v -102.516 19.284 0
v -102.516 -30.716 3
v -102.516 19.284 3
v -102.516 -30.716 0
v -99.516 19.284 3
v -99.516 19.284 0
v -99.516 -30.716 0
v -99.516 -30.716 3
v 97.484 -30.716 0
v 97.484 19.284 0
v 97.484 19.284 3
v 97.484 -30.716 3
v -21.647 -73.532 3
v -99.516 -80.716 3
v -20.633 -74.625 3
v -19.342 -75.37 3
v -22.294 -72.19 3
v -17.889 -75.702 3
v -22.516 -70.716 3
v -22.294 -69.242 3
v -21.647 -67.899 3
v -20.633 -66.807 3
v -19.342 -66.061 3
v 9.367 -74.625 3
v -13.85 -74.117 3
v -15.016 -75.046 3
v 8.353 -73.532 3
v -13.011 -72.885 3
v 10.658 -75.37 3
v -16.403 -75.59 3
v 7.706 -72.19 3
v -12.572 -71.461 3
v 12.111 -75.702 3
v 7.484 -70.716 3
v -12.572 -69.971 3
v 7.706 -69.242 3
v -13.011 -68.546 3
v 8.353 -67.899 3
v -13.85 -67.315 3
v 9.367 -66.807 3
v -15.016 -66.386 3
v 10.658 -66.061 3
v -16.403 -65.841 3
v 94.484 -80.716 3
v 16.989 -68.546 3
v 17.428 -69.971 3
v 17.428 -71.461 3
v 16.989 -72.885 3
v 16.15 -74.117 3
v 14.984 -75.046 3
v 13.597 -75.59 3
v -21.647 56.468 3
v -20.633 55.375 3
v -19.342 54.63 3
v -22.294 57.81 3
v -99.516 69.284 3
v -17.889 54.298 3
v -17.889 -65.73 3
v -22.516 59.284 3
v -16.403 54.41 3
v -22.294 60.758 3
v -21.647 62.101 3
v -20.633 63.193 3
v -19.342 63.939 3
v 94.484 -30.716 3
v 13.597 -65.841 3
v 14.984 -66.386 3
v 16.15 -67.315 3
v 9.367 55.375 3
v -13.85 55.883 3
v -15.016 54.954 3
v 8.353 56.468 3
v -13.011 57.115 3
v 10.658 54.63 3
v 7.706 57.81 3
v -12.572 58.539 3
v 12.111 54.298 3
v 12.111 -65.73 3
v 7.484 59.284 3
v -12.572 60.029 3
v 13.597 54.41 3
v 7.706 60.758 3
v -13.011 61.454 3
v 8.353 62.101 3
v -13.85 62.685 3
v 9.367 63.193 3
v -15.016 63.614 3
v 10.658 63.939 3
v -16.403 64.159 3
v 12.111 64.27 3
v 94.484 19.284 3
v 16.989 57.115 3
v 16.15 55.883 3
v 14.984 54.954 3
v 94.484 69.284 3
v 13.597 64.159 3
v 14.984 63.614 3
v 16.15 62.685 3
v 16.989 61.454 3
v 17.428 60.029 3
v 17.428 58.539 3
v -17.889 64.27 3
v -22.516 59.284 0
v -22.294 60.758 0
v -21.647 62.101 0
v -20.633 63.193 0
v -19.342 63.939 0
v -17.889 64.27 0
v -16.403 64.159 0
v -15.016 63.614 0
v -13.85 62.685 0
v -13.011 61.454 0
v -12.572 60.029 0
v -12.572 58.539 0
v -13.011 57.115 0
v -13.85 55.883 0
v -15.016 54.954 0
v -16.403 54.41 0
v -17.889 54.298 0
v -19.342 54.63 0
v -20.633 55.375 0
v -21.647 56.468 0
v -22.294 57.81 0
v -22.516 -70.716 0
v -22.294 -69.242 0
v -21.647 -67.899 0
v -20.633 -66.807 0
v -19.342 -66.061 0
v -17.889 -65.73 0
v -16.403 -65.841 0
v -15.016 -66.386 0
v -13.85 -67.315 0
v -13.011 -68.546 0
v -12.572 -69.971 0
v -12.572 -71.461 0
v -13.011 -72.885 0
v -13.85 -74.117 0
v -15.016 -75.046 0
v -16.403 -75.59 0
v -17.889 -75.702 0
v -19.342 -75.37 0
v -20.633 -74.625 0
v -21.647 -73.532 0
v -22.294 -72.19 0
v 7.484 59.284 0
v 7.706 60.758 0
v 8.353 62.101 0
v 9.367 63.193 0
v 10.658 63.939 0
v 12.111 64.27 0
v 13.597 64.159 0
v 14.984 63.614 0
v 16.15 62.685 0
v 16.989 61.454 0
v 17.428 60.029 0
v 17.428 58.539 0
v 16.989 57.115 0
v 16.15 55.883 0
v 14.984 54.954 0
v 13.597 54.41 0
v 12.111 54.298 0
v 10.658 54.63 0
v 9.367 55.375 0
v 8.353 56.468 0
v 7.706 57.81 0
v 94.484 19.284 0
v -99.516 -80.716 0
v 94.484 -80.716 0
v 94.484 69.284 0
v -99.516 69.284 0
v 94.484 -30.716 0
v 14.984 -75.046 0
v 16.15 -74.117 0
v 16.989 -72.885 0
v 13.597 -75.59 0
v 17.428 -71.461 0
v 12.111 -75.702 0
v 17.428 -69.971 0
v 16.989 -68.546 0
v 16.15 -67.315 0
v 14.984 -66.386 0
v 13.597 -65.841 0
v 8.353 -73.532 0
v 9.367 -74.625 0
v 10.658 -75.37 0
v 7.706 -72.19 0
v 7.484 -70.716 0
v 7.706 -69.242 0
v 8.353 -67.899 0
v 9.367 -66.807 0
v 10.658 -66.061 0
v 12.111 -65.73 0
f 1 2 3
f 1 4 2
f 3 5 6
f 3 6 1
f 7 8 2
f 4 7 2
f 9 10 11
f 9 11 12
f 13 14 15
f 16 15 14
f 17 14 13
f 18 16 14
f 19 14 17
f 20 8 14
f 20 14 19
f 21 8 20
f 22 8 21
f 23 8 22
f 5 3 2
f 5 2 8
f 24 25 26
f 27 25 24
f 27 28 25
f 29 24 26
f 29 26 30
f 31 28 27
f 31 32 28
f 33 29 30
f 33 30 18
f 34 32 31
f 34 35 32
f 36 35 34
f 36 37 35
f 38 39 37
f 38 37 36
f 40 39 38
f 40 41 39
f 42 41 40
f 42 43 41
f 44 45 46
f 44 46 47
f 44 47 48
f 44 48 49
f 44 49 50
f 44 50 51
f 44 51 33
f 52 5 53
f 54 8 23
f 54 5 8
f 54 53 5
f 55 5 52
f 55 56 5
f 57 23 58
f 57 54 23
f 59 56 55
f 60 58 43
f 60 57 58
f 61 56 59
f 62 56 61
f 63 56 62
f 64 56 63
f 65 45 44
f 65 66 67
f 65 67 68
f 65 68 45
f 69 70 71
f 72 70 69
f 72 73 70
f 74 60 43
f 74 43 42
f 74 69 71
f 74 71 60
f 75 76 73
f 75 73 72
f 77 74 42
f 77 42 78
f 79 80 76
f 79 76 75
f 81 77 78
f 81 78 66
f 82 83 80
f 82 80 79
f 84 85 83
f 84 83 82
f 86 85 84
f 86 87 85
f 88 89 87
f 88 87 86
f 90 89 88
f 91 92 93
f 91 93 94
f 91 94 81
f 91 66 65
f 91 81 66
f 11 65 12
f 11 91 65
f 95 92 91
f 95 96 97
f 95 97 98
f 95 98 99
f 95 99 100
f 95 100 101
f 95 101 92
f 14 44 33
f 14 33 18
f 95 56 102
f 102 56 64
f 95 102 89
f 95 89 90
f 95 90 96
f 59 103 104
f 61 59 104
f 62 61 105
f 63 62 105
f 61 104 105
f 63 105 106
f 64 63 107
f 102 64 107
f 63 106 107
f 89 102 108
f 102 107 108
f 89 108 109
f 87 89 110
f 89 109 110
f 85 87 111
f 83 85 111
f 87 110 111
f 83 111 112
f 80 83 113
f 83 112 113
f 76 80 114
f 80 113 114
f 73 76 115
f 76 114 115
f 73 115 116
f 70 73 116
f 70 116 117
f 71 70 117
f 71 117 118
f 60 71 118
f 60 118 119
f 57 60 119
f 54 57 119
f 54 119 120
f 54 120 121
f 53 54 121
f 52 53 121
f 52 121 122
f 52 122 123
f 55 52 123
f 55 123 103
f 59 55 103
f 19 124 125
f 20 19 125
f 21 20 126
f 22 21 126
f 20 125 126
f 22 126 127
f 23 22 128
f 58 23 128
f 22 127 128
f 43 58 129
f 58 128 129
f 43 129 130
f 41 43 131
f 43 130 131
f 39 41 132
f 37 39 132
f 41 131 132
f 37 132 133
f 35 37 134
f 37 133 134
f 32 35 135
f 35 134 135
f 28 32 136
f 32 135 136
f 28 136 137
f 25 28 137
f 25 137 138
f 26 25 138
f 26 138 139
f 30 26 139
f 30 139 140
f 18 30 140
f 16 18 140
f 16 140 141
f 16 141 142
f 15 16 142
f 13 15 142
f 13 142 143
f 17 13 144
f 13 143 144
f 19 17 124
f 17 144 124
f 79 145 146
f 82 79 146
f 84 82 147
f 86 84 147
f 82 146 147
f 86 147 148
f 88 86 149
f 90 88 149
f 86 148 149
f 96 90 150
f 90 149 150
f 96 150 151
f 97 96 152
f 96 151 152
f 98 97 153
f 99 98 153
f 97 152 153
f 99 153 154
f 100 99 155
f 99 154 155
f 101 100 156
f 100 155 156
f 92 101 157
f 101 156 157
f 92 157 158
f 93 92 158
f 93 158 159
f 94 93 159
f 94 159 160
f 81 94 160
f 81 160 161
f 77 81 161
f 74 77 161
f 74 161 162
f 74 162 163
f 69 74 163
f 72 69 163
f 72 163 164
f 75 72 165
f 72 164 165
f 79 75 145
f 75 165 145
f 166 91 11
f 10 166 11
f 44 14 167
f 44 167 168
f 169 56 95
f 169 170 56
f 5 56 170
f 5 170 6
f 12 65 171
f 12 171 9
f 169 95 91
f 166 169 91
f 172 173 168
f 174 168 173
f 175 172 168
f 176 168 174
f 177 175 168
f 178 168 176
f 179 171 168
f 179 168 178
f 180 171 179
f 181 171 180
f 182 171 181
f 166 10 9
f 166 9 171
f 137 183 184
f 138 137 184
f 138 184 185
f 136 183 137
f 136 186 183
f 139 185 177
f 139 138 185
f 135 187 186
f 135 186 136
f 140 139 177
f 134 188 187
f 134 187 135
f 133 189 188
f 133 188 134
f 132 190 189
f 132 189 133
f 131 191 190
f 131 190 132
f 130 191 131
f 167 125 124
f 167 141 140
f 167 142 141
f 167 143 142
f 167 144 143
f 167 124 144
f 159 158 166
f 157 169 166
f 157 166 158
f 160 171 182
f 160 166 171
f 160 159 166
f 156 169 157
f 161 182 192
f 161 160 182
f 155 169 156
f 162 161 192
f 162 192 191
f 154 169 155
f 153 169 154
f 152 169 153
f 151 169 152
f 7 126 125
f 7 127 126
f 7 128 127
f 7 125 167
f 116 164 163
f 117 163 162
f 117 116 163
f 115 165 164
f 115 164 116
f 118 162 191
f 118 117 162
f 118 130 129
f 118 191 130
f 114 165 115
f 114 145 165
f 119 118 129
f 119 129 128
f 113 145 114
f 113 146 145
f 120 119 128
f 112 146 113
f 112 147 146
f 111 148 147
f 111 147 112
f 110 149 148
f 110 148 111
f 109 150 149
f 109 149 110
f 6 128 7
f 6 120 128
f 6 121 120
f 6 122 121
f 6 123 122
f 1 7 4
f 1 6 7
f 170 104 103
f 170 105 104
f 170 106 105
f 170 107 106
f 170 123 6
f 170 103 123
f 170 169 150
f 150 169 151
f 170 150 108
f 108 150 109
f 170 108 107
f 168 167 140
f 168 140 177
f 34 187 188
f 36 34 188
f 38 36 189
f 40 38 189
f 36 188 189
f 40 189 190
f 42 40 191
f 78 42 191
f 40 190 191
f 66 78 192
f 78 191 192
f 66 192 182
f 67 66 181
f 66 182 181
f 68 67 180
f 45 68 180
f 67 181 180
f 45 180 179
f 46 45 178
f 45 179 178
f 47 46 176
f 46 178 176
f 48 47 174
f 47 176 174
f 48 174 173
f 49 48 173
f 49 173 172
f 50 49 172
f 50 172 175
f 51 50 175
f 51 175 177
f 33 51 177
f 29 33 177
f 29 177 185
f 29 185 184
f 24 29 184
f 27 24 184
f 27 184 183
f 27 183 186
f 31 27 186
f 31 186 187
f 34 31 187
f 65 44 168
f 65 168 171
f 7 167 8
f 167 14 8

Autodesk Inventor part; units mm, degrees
ref_plane "YZ Plane" through (0, 0, 0) normal (1, 0, 0) x (0, 1, 0)
ref_plane "XZ Plane" through (0, 0, 0) normal (0, 1, 0) x (-1, 0, 0)
ref_plane "XY Plane" through (0, 0, 0) normal (0, 0, 1) x (1, 0, 0)
sketch "Sketch1" plane through (0, 0, 0) normal (0, 0, 1) x (1, 0, 0)
  line L0 (-102.5157, 69.2842) -> (97.4843, 69.2842)
  line L1 (97.4843, 69.2842) -> (97.4843, -80.7158)
  line L2 (97.4843, -80.7158) -> (-102.5157, -80.7158)
  line L3 (-102.5157, -80.7158) -> (-102.5157, 69.2842)
  point P0 (0, 0)
extrude "Extrusion1" add sketch "Sketch1" along normal blind 3
sketch "Sketch3" plane through (0, 0, 3) normal (0, 0, 1) x (1, 0, 0)
  point P0 (0, 0)
sketch "Sketch4" plane through (0, 0, 3) normal (0, 0, 1) x (1, 0, 0)
  line L0 (97.4843, 69.2842) -> (-102.5157, 69.2842) projected
  line L1 (-102.5157, 69.2842) -> (-99.5157, 69.2842)
  line L2 (-99.5157, 69.2842) -> (-99.5157, 19.2842)
  line L3 (-99.5157, 19.2842) -> (-102.5157, 19.2842)
  line L4 (-102.5157, 19.2842) -> (-102.5157, 69.2842)
  point P0 (0, 0)
extrude "Extrusion2" cut sketch "Sketch4" against normal blind 3
sketch "Sketch5" plane through (0, 0, 3) normal (0, 0, 1) x (1, 0, 0)
  line L0 (97.4843, -80.7158) -> (94.4843, -80.7158)
  line L1 (94.4843, -80.7158) -> (94.4843, -30.7158)
  line L2 (94.4843, -30.7158) -> (97.4843, -30.7158)
  line L3 (97.4843, -30.7158) -> (97.4843, -80.7158)
  point P0 (0, 0)
  point P1 (-102.5157, -80.7158)
  dimension "d17" = 3
  dimension "d18" = 50
extrude "Extrusion3" cut sketch "Sketch5" against normal blind 3
sketch "Sketch6" plane through (0, 0, 3) normal (0, 0, 1) x (1, 0, 0)
  line L0 (97.4843, -30.7158) -> (97.4843, 69.2842) projected
  line L1 (97.4843, 69.2842) -> (94.4843, 69.2842)
  line L2 (94.4843, 69.2842) -> (94.4843, 19.2842)
  line L3 (94.4843, 19.2842) -> (97.4843, 19.2842)
  line L4 (97.4843, 19.2842) -> (97.4843, 69.2842)
  point P0 (0, 0)
  dimension "d21" = 50
  dimension "d22" = 3
extrude "Extrusion4" cut sketch "Sketch6" against normal blind 3
sketch "Sketch7" plane through (0, 0, 3) normal (0, 0, 1) x (1, 0, 0)
  line L0 (-102.5157, 19.2842) -> (-102.5157, -80.7158) projected
  line L1 (-102.5157, -80.7158) -> (-99.5157, -80.7158)
  line L2 (-99.5157, -80.7158) -> (-99.5157, -30.7158)
  line L3 (-99.5157, -30.7158) -> (-102.5157, -30.7158)
  line L4 (-102.5157, -30.7158) -> (-102.5157, -80.7158)
  point P0 (0, 0)
  dimension "d25" = 50
  dimension "d26" = 3
extrude "Extrusion5" cut sketch "Sketch7" against normal blind 3
sketch "Sketch8" plane through (0, 0, 3) normal (0, 0, 1) x (1, 0, 0)
  line L0 (-102.5157, -30.7158) -> (-102.5157, 19.2842) projected
  line L1 (97.4843, -30.7158) -> (94.4843, -30.7158) projected
  line L2 (94.4843, -80.7158) -> (-99.5157, -80.7158) projected
  line L3 (-10.0157, -50.7158) -> (4.9843, -50.7158)
  line L4 (4.9843, -50.7158) -> (4.9843, -80.7158)
  line L5 (4.9843, -80.7158) -> (-10.0157, -80.7158)
  line L6 (-10.0157, -80.7158) -> (-10.0157, -50.7158)
  point P0 (0, 0)
  dimension "d32" = 15
  dimension "d33" = 30
extrude "Extrusion6" cut sketch "Sketch8" against normal blind 3
sketch "Sketch9" plane through (-10.0157, -50.7158, 3) normal (0, -1, 0) x (1, 0, 0)
  line L0 (0, 0) -> (15, 0) projected
  line L1 (15, -3) -> (0, -3) projected
  line L2 (0, 0) -> (15, 0)
  line L3 (15, 0) -> (15, -3)
  line L4 (15, -3) -> (0, -3)
  line L5 (0, -3) -> (0, 0)
  point P0 (10.0157, -3)
extrude "Extrusion7" add sketch "Sketch9" along normal blind 30
sketch "Sketch10" plane through (0, 0, 0) normal (0, 0, -1) x (-1, 0, 0)
  line L0 (-94.4843, 69.2842) -> (99.5157, 69.2842) projected
  line L1 (99.5157, -80.7158) -> (-94.4843, -80.7158) projected
  line L2 (-97.4843, 19.2842) -> (-97.4843, -30.7158) projected
  line L3 (102.5157, 19.2842) -> (102.5157, -30.7158) projected
  line L4 (2.5157, 69.2842) -> (102.5157, 69.2842)
  circle A0 centre (-12.4843, 59.2842) radius 5
  circle A1 centre (17.5157, 59.2842) radius 5
  circle A2 centre (-12.4843, -70.7158) radius 5
  circle A3 centre (17.5157, -70.7158) radius 5
  point P0 (0, 0)
extrude "Extrusion8" cut sketch "Sketch10" against normal blind 24.75
properties part number "Level1"
